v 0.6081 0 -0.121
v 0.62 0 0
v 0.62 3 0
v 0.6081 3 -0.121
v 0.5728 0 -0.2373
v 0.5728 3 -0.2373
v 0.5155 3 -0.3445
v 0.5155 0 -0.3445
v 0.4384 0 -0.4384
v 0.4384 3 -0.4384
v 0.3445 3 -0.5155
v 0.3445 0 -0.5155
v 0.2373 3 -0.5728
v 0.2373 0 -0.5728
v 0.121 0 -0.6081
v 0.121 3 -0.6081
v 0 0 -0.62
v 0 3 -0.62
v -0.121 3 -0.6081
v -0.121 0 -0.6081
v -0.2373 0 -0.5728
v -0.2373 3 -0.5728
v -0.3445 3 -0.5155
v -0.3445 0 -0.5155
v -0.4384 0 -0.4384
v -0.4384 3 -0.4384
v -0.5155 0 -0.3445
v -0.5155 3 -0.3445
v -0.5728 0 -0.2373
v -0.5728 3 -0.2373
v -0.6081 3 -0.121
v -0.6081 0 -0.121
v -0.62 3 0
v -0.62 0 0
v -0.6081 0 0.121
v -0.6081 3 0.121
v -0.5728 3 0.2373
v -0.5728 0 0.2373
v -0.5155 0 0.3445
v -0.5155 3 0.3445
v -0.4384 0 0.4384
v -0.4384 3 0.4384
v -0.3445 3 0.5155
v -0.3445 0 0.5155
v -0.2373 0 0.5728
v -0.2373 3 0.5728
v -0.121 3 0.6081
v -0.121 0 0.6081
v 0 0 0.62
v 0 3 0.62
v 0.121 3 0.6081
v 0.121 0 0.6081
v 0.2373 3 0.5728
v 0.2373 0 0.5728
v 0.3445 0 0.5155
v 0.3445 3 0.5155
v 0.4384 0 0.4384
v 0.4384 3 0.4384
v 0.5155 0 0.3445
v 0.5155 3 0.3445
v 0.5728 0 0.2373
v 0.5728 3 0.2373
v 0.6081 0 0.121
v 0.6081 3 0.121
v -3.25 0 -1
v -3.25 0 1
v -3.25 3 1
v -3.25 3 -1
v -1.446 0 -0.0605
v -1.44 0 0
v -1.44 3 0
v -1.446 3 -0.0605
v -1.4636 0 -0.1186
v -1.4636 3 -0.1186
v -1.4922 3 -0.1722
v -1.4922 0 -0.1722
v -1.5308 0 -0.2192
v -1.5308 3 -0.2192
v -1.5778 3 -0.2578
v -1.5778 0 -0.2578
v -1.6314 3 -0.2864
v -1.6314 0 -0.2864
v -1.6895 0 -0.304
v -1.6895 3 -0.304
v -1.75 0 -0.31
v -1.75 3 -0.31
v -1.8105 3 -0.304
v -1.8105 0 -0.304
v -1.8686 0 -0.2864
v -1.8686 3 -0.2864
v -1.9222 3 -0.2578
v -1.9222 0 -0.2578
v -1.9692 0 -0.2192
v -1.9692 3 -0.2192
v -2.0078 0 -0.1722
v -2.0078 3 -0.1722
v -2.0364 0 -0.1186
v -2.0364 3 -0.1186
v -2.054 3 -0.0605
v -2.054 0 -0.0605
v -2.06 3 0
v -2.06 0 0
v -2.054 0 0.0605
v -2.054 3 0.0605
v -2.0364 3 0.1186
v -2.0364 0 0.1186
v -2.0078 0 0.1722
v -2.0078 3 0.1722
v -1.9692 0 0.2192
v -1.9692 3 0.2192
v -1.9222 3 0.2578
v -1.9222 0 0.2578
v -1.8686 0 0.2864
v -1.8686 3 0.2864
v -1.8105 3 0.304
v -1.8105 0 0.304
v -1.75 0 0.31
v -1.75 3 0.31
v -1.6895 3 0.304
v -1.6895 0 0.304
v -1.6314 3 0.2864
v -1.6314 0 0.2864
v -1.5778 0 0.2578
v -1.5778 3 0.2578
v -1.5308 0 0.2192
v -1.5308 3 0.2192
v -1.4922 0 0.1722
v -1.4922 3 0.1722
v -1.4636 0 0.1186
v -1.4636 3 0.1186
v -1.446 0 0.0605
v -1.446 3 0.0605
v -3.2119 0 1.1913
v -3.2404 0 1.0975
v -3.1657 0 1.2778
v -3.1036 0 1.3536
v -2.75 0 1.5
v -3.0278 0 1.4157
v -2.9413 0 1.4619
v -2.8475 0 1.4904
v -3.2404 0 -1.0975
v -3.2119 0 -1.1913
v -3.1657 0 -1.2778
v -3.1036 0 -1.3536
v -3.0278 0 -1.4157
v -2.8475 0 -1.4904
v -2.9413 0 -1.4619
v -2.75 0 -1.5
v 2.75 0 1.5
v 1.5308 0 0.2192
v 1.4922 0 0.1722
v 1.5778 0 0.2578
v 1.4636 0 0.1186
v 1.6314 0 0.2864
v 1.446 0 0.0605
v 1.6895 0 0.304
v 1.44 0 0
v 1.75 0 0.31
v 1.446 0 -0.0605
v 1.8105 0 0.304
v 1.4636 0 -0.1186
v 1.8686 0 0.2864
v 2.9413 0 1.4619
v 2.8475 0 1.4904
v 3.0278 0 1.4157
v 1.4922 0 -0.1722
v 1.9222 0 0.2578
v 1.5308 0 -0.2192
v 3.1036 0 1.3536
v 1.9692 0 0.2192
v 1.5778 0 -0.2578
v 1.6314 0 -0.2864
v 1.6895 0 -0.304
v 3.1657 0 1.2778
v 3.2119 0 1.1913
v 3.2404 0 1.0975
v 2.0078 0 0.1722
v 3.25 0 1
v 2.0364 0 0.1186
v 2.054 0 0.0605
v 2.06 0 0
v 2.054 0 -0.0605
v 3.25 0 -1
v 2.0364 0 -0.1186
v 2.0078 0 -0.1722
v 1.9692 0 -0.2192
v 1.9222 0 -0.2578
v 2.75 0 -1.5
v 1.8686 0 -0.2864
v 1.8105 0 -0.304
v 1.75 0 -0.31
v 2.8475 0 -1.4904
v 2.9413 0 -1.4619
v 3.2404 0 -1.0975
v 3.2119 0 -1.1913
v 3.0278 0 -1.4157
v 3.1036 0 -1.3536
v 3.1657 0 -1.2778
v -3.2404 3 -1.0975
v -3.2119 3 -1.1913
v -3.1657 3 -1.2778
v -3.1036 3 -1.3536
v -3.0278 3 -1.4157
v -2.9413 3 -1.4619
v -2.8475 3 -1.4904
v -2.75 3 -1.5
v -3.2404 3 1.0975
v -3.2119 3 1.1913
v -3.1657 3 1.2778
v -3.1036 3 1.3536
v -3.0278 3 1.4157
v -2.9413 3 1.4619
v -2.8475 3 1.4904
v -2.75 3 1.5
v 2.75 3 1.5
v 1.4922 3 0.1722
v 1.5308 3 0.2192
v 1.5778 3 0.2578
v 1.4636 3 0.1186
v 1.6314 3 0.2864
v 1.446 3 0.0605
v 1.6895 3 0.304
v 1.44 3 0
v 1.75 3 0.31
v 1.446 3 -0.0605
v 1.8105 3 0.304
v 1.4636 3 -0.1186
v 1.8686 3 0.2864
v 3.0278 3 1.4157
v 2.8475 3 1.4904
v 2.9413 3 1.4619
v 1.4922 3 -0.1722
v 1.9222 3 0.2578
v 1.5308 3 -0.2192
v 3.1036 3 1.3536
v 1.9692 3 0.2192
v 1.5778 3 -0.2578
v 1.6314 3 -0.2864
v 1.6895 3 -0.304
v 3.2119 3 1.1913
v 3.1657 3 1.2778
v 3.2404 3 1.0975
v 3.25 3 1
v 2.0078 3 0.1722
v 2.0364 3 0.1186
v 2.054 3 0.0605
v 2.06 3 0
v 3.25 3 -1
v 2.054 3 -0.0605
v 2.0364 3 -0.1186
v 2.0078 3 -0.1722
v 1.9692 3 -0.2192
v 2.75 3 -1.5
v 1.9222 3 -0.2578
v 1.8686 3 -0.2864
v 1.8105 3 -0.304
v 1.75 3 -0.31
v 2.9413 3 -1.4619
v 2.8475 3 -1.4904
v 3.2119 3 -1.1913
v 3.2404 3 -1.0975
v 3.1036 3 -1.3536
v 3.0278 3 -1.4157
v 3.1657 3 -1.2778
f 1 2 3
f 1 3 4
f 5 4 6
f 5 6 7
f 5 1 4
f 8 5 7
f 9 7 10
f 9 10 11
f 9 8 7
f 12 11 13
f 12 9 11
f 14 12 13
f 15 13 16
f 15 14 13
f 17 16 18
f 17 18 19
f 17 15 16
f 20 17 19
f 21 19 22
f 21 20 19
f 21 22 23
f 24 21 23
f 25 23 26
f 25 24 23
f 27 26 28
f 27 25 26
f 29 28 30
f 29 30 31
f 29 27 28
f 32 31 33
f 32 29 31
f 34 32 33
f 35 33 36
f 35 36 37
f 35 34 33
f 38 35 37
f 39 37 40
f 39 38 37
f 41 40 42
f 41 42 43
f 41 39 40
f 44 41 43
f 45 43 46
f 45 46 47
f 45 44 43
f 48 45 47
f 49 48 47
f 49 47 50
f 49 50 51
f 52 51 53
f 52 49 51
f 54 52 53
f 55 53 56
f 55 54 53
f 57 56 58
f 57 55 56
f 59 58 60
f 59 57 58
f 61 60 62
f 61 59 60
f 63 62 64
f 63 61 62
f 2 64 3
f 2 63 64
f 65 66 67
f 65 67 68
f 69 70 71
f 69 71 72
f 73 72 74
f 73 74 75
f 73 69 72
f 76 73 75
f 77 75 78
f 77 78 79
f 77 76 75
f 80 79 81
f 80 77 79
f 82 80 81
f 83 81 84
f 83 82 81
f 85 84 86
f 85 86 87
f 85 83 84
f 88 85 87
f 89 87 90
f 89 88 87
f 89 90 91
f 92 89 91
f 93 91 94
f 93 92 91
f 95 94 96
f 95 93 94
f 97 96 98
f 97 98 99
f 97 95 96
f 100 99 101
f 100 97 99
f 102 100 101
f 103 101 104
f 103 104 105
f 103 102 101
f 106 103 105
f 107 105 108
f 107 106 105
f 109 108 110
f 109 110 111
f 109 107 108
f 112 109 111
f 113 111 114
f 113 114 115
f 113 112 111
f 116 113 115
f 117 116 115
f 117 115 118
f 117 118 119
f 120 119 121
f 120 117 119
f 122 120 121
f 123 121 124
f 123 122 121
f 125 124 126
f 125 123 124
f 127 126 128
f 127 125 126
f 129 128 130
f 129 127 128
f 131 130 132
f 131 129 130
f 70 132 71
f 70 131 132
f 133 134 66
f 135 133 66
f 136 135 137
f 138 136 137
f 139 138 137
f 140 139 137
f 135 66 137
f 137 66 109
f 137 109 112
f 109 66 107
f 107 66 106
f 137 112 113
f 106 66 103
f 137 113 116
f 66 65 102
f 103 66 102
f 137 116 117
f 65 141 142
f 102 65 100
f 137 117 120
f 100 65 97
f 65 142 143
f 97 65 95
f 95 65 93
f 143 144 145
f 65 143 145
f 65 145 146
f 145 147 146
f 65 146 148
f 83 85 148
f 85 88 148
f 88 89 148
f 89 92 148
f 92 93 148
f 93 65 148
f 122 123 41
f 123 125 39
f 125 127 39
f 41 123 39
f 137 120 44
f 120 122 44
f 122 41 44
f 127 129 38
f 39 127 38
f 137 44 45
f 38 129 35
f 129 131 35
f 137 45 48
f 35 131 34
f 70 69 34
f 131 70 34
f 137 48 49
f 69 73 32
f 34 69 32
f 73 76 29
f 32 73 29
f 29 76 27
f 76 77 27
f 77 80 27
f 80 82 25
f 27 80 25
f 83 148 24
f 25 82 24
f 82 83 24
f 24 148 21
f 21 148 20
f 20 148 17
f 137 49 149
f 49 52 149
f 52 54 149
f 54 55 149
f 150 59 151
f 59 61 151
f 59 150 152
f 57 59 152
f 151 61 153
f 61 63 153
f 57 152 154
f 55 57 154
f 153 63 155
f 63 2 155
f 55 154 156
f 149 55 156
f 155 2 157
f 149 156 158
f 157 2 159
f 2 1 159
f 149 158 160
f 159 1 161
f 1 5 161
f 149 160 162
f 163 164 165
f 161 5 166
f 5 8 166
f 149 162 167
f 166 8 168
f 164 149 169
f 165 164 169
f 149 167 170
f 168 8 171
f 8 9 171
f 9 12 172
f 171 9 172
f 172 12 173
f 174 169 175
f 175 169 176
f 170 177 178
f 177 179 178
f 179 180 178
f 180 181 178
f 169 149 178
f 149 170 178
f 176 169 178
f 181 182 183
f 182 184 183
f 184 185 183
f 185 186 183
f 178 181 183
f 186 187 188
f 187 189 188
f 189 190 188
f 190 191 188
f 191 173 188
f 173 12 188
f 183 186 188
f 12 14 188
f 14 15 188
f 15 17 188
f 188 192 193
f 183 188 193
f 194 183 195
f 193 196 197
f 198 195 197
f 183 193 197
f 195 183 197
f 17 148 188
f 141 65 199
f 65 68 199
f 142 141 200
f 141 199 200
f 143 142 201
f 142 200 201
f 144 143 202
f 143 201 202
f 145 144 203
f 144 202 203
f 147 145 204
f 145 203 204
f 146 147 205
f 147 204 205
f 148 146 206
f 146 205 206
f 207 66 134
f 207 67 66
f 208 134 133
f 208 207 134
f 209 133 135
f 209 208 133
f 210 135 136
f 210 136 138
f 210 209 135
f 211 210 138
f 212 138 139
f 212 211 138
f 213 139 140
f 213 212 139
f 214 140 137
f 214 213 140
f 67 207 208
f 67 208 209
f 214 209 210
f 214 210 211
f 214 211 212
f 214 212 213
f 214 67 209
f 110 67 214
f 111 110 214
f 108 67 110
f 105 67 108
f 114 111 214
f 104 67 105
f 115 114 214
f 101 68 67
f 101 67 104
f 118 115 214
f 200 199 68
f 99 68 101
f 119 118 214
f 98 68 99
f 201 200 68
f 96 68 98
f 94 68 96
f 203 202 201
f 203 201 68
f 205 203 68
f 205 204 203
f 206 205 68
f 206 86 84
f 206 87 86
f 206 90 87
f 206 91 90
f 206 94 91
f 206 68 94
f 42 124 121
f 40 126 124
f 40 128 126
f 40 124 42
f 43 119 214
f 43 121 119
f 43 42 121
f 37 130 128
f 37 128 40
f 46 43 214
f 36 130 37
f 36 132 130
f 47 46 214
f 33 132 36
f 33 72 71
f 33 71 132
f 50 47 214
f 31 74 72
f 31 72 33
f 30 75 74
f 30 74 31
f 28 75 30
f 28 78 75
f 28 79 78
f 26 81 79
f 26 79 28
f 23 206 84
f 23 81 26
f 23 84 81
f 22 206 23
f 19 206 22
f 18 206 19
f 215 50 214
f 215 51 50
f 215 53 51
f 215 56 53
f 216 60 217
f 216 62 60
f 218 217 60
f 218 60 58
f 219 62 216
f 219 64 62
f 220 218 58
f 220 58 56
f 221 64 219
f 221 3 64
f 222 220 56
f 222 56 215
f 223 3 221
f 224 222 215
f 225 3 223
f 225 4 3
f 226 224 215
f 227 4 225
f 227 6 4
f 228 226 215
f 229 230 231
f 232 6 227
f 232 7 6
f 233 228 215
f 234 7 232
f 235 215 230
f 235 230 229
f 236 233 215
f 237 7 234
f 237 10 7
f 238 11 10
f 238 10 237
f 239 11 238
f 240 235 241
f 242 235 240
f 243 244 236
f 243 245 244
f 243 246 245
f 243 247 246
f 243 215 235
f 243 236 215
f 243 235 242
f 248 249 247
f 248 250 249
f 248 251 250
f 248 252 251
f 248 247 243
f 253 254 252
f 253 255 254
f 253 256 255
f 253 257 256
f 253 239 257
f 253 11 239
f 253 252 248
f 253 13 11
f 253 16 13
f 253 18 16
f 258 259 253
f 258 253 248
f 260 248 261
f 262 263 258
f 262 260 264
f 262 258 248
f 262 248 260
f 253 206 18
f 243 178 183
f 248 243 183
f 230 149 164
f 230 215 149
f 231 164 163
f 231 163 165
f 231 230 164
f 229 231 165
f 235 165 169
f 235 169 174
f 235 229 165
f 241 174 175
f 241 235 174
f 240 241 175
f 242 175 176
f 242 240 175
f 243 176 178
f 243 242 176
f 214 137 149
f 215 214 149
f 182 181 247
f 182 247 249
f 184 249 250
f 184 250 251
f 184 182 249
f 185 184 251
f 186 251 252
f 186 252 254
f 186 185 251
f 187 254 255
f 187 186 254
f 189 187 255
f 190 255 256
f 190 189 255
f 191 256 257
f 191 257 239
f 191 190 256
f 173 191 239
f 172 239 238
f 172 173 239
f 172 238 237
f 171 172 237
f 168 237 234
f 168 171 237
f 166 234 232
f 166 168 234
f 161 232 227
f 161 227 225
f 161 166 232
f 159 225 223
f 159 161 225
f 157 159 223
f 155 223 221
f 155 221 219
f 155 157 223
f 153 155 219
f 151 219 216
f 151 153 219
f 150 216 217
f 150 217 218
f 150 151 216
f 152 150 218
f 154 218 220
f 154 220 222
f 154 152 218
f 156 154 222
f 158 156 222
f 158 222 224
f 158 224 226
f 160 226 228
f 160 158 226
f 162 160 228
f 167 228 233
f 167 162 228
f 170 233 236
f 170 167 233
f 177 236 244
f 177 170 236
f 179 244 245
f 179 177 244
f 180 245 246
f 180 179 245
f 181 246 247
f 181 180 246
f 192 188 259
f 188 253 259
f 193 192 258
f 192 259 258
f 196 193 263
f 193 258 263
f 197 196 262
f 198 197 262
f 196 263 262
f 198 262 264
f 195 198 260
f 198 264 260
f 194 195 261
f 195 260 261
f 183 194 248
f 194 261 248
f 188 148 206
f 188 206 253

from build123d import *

# Parameters (mm, degrees)
SKETCH1_W           = 6.5
SKETCH1_H           = 3
SKETCH1_R           = 0.31
SKETCH1_R_2         = 0.62
BOSS_EXTRUDE1_DEPTH = 3
FILLET1_R           = 0.5


with BuildPart() as part:
    # Sketch1 → Boss-Extrude1 (new body)
    with BuildSketch(Plane(origin=(0, 0, 0), x_dir=(1, 0, 0), z_dir=(0, 1, 0))):
        Rectangle(SKETCH1_W, SKETCH1_H)
        with Locations((-1.75, 0)):
            Circle(SKETCH1_R, mode=Mode.SUBTRACT)
        Circle(SKETCH1_R_2, mode=Mode.SUBTRACT)
        with Locations((1.75, 0)):
            Circle(SKETCH1_R, mode=Mode.SUBTRACT)
    extrude(amount=BOSS_EXTRUDE1_DEPTH)

    # Fillet1
    fillet1_edges = [part.edges().sort_by_distance(p)[0] for p in [
        (-3.25, 1.5, -1.5),
        (3.25, 1.5, -1.5),
        (3.25, 1.5, 1.5),
        (-3.25, 1.5, 1.5),
    ]]
    fillet(fillet1_edges, radius=FILLET1_R)


solid = part.part
